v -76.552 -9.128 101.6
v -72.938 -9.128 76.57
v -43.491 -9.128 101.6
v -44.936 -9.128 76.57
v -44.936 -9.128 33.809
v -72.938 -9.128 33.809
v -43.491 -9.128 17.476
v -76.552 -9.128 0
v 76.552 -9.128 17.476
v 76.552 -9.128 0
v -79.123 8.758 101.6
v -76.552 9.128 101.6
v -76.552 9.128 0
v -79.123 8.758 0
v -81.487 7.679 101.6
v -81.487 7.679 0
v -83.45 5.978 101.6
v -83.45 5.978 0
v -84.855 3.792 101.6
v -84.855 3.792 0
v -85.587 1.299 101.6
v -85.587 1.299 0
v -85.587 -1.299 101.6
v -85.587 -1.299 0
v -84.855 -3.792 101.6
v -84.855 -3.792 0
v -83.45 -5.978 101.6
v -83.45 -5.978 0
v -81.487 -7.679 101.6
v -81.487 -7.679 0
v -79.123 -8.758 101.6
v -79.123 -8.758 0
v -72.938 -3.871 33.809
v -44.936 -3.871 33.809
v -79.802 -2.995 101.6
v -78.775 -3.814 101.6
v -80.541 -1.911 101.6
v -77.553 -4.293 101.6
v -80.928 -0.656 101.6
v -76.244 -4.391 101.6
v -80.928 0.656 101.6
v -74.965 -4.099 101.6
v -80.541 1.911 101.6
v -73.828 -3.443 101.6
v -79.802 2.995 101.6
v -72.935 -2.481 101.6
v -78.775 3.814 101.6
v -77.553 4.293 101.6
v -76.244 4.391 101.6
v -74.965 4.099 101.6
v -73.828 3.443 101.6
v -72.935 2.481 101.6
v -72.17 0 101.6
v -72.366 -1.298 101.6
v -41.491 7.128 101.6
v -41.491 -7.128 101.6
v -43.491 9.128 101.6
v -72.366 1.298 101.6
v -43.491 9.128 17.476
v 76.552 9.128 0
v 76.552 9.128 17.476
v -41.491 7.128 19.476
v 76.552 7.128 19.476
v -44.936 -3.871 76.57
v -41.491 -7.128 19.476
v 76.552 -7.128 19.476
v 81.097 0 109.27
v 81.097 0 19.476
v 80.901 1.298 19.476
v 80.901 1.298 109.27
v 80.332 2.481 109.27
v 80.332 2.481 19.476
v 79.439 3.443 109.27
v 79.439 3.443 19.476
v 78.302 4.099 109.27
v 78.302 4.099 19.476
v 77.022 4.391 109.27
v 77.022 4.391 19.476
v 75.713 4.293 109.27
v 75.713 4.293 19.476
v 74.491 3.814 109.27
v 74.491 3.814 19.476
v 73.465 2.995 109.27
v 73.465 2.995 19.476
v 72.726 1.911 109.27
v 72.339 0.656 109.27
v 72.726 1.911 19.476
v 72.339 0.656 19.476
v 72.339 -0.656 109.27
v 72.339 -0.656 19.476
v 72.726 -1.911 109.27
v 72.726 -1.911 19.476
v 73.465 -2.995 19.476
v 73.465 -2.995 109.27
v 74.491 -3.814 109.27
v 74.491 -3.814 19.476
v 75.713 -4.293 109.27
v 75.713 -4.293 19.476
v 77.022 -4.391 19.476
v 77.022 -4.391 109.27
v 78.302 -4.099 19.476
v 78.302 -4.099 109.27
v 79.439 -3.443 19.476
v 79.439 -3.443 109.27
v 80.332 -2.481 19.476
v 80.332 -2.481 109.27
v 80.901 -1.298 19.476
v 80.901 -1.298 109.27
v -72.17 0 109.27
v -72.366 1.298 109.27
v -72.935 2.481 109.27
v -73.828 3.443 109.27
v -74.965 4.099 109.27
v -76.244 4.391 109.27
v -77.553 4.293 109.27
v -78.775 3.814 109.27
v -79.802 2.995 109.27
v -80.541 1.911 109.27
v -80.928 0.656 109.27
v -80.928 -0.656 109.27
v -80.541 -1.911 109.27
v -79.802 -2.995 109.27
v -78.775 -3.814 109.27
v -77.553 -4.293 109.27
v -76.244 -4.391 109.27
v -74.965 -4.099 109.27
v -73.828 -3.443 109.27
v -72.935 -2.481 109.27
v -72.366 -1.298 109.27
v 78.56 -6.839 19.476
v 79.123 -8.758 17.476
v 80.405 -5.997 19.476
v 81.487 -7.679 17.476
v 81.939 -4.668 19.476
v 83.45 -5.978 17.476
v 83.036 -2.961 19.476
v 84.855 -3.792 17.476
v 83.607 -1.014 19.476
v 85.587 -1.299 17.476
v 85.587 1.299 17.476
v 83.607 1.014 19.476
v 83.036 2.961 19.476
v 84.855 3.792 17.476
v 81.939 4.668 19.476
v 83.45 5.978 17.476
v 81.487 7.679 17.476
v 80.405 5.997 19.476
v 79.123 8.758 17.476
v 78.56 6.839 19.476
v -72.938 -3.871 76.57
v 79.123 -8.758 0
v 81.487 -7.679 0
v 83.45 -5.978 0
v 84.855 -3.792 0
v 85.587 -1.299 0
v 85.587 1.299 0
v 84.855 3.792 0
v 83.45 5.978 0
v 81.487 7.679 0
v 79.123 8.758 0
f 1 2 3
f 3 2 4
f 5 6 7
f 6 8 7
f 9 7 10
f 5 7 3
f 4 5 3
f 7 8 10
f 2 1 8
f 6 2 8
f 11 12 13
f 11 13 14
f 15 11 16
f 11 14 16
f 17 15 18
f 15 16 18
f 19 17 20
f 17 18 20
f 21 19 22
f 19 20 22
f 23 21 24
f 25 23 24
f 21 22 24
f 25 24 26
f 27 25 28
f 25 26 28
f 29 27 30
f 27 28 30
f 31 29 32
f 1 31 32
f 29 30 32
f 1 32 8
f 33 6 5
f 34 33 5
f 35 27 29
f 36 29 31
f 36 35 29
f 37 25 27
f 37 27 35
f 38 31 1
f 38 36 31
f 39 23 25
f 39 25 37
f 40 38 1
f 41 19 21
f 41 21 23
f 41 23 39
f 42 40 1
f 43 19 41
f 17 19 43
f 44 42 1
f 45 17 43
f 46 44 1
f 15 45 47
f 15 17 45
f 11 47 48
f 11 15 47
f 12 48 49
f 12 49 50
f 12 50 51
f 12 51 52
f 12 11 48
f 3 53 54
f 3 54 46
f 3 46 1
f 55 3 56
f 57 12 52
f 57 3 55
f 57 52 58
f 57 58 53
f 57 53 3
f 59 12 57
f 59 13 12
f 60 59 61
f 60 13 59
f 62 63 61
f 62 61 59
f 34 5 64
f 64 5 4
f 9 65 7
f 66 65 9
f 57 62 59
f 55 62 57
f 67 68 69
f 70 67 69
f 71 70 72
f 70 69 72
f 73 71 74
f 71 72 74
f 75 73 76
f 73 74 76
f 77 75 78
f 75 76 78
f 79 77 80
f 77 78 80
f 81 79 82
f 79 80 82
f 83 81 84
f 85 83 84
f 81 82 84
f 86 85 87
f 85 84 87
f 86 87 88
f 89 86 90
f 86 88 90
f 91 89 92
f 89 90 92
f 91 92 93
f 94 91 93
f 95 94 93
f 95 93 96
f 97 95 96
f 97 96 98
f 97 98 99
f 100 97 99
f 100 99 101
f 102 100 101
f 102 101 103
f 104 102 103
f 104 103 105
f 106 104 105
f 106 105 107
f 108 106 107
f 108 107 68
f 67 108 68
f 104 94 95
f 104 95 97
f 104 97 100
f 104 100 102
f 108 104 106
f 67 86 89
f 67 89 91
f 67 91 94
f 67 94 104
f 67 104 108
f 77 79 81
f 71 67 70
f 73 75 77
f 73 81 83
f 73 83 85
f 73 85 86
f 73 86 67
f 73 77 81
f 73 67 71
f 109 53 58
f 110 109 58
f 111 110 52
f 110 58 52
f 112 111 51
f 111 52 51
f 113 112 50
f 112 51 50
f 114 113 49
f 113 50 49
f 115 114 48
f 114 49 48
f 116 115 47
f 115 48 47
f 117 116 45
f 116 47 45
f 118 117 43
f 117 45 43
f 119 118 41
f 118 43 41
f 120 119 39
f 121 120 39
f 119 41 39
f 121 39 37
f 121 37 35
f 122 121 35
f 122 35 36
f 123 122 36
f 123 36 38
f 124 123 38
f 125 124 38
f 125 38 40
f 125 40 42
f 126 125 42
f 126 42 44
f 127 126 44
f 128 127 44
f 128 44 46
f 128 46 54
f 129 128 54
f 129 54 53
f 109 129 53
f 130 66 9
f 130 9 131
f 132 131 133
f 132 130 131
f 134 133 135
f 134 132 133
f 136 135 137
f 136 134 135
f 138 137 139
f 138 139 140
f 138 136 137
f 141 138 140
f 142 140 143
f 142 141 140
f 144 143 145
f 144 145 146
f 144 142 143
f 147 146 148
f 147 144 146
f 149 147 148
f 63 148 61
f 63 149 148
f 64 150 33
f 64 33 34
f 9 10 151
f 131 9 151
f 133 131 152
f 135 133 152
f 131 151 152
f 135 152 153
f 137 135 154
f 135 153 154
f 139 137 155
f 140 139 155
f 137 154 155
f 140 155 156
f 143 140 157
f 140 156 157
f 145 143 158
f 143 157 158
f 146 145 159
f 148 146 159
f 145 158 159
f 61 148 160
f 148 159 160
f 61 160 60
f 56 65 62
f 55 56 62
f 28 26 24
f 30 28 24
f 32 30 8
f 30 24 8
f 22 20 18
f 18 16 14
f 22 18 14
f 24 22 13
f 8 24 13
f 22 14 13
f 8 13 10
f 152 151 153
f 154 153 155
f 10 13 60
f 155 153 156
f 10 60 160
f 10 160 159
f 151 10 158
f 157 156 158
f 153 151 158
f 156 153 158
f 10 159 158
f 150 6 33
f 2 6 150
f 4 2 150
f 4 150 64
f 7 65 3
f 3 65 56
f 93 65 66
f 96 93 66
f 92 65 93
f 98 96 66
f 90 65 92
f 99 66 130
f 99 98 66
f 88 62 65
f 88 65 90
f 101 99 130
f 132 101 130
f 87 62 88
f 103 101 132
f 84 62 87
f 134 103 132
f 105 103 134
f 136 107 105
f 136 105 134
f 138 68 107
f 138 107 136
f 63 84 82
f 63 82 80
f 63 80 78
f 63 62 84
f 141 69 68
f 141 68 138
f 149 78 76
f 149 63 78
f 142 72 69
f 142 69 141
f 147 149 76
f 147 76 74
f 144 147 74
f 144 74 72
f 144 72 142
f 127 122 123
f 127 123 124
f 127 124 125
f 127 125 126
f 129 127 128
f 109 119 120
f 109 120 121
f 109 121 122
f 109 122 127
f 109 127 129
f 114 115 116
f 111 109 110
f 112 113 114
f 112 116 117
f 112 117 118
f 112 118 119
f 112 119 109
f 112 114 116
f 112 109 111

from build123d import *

# Parameters (mm, degrees)
F0_W     = 118.0431097746
F0_H     = 18.2562172413
F1_DEPTH = 19.4758269936
F0_W_2   = 35.0601822138
F2_DEPTH = 101.6
F3_W     = 28.001986444
F3_H     = 42.7611395717
F4_DEPTH = 5.2572349086
F8_R     = 4.4035732841
F9_DEPTH = 109.2703565955
F10_SIZE = 2


# Not quite as in the source:
# - a feature of the source that left no trace in its solid (it failed there, or was rolled back) is left out


with BuildPart() as f1:
    # F0 (on Top) → F1 (new body)
    with BuildSketch(Plane.XY):
        with BuildLine():
            Line((76.5516459942, 9.1281086206), (76.5516459942, -9.1281086206))
            ThreePointArc((76.5516459942, -9.1281086206), (85.6797546148, 0), (76.5516459942, 9.1281086206))
        make_face()
        with Locations((17.5300911069, 0)):
            Rectangle(F0_W, F0_H)
    extrude(amount=F1_DEPTH)

    # F0 (on Top) → F2 (join)
    with BuildSketch(Plane.XY):
        with Locations((-59.0215548873, 0)):
            Rectangle(F0_W_2, F0_H)
        with BuildLine():
            ThreePointArc((-76.5516459942, 9.1281086206), (-85.6797546148, 0), (-76.5516459942, -9.1281086206))
            Line((-76.5516459942, -9.1281086206), (-76.5516459942, 9.1281086206))
        make_face()
    extrude(amount=F2_DEPTH)

    # F3 (on face) → F4 (cut)
    with BuildSketch(Plane.XZ.offset(9.1281086206)):
        with Locations((-58.9374192059, 55.1895685494)):
            Rectangle(F3_W, F3_H)
    extrude(amount=-F4_DEPTH, mode=Mode.SUBTRACT)

    # F8 (on Top) → F9 (join)
    with BuildSketch(Plane.XY):
        with Locations((76.6932368279, 0)):
            Circle(F8_R)
        with Locations((-76.5735656023, 0)):
            Circle(F8_R)
    extrude(amount=F9_DEPTH)

    # F10
    f10_edges = [f1.edges().sort_by_distance(p)[0] for p in [
        (-41.491464, -9.128109, 60.537913),
        (17.530091, -9.128109, 19.475827),
        (-41.491464, 9.128109, 60.537913),
        (85.679755, 0, 19.475827),
        (17.530091, 9.128109, 19.475827),
    ]]
    chamfer(f10_edges, length=F10_SIZE)


solid = f1.part
